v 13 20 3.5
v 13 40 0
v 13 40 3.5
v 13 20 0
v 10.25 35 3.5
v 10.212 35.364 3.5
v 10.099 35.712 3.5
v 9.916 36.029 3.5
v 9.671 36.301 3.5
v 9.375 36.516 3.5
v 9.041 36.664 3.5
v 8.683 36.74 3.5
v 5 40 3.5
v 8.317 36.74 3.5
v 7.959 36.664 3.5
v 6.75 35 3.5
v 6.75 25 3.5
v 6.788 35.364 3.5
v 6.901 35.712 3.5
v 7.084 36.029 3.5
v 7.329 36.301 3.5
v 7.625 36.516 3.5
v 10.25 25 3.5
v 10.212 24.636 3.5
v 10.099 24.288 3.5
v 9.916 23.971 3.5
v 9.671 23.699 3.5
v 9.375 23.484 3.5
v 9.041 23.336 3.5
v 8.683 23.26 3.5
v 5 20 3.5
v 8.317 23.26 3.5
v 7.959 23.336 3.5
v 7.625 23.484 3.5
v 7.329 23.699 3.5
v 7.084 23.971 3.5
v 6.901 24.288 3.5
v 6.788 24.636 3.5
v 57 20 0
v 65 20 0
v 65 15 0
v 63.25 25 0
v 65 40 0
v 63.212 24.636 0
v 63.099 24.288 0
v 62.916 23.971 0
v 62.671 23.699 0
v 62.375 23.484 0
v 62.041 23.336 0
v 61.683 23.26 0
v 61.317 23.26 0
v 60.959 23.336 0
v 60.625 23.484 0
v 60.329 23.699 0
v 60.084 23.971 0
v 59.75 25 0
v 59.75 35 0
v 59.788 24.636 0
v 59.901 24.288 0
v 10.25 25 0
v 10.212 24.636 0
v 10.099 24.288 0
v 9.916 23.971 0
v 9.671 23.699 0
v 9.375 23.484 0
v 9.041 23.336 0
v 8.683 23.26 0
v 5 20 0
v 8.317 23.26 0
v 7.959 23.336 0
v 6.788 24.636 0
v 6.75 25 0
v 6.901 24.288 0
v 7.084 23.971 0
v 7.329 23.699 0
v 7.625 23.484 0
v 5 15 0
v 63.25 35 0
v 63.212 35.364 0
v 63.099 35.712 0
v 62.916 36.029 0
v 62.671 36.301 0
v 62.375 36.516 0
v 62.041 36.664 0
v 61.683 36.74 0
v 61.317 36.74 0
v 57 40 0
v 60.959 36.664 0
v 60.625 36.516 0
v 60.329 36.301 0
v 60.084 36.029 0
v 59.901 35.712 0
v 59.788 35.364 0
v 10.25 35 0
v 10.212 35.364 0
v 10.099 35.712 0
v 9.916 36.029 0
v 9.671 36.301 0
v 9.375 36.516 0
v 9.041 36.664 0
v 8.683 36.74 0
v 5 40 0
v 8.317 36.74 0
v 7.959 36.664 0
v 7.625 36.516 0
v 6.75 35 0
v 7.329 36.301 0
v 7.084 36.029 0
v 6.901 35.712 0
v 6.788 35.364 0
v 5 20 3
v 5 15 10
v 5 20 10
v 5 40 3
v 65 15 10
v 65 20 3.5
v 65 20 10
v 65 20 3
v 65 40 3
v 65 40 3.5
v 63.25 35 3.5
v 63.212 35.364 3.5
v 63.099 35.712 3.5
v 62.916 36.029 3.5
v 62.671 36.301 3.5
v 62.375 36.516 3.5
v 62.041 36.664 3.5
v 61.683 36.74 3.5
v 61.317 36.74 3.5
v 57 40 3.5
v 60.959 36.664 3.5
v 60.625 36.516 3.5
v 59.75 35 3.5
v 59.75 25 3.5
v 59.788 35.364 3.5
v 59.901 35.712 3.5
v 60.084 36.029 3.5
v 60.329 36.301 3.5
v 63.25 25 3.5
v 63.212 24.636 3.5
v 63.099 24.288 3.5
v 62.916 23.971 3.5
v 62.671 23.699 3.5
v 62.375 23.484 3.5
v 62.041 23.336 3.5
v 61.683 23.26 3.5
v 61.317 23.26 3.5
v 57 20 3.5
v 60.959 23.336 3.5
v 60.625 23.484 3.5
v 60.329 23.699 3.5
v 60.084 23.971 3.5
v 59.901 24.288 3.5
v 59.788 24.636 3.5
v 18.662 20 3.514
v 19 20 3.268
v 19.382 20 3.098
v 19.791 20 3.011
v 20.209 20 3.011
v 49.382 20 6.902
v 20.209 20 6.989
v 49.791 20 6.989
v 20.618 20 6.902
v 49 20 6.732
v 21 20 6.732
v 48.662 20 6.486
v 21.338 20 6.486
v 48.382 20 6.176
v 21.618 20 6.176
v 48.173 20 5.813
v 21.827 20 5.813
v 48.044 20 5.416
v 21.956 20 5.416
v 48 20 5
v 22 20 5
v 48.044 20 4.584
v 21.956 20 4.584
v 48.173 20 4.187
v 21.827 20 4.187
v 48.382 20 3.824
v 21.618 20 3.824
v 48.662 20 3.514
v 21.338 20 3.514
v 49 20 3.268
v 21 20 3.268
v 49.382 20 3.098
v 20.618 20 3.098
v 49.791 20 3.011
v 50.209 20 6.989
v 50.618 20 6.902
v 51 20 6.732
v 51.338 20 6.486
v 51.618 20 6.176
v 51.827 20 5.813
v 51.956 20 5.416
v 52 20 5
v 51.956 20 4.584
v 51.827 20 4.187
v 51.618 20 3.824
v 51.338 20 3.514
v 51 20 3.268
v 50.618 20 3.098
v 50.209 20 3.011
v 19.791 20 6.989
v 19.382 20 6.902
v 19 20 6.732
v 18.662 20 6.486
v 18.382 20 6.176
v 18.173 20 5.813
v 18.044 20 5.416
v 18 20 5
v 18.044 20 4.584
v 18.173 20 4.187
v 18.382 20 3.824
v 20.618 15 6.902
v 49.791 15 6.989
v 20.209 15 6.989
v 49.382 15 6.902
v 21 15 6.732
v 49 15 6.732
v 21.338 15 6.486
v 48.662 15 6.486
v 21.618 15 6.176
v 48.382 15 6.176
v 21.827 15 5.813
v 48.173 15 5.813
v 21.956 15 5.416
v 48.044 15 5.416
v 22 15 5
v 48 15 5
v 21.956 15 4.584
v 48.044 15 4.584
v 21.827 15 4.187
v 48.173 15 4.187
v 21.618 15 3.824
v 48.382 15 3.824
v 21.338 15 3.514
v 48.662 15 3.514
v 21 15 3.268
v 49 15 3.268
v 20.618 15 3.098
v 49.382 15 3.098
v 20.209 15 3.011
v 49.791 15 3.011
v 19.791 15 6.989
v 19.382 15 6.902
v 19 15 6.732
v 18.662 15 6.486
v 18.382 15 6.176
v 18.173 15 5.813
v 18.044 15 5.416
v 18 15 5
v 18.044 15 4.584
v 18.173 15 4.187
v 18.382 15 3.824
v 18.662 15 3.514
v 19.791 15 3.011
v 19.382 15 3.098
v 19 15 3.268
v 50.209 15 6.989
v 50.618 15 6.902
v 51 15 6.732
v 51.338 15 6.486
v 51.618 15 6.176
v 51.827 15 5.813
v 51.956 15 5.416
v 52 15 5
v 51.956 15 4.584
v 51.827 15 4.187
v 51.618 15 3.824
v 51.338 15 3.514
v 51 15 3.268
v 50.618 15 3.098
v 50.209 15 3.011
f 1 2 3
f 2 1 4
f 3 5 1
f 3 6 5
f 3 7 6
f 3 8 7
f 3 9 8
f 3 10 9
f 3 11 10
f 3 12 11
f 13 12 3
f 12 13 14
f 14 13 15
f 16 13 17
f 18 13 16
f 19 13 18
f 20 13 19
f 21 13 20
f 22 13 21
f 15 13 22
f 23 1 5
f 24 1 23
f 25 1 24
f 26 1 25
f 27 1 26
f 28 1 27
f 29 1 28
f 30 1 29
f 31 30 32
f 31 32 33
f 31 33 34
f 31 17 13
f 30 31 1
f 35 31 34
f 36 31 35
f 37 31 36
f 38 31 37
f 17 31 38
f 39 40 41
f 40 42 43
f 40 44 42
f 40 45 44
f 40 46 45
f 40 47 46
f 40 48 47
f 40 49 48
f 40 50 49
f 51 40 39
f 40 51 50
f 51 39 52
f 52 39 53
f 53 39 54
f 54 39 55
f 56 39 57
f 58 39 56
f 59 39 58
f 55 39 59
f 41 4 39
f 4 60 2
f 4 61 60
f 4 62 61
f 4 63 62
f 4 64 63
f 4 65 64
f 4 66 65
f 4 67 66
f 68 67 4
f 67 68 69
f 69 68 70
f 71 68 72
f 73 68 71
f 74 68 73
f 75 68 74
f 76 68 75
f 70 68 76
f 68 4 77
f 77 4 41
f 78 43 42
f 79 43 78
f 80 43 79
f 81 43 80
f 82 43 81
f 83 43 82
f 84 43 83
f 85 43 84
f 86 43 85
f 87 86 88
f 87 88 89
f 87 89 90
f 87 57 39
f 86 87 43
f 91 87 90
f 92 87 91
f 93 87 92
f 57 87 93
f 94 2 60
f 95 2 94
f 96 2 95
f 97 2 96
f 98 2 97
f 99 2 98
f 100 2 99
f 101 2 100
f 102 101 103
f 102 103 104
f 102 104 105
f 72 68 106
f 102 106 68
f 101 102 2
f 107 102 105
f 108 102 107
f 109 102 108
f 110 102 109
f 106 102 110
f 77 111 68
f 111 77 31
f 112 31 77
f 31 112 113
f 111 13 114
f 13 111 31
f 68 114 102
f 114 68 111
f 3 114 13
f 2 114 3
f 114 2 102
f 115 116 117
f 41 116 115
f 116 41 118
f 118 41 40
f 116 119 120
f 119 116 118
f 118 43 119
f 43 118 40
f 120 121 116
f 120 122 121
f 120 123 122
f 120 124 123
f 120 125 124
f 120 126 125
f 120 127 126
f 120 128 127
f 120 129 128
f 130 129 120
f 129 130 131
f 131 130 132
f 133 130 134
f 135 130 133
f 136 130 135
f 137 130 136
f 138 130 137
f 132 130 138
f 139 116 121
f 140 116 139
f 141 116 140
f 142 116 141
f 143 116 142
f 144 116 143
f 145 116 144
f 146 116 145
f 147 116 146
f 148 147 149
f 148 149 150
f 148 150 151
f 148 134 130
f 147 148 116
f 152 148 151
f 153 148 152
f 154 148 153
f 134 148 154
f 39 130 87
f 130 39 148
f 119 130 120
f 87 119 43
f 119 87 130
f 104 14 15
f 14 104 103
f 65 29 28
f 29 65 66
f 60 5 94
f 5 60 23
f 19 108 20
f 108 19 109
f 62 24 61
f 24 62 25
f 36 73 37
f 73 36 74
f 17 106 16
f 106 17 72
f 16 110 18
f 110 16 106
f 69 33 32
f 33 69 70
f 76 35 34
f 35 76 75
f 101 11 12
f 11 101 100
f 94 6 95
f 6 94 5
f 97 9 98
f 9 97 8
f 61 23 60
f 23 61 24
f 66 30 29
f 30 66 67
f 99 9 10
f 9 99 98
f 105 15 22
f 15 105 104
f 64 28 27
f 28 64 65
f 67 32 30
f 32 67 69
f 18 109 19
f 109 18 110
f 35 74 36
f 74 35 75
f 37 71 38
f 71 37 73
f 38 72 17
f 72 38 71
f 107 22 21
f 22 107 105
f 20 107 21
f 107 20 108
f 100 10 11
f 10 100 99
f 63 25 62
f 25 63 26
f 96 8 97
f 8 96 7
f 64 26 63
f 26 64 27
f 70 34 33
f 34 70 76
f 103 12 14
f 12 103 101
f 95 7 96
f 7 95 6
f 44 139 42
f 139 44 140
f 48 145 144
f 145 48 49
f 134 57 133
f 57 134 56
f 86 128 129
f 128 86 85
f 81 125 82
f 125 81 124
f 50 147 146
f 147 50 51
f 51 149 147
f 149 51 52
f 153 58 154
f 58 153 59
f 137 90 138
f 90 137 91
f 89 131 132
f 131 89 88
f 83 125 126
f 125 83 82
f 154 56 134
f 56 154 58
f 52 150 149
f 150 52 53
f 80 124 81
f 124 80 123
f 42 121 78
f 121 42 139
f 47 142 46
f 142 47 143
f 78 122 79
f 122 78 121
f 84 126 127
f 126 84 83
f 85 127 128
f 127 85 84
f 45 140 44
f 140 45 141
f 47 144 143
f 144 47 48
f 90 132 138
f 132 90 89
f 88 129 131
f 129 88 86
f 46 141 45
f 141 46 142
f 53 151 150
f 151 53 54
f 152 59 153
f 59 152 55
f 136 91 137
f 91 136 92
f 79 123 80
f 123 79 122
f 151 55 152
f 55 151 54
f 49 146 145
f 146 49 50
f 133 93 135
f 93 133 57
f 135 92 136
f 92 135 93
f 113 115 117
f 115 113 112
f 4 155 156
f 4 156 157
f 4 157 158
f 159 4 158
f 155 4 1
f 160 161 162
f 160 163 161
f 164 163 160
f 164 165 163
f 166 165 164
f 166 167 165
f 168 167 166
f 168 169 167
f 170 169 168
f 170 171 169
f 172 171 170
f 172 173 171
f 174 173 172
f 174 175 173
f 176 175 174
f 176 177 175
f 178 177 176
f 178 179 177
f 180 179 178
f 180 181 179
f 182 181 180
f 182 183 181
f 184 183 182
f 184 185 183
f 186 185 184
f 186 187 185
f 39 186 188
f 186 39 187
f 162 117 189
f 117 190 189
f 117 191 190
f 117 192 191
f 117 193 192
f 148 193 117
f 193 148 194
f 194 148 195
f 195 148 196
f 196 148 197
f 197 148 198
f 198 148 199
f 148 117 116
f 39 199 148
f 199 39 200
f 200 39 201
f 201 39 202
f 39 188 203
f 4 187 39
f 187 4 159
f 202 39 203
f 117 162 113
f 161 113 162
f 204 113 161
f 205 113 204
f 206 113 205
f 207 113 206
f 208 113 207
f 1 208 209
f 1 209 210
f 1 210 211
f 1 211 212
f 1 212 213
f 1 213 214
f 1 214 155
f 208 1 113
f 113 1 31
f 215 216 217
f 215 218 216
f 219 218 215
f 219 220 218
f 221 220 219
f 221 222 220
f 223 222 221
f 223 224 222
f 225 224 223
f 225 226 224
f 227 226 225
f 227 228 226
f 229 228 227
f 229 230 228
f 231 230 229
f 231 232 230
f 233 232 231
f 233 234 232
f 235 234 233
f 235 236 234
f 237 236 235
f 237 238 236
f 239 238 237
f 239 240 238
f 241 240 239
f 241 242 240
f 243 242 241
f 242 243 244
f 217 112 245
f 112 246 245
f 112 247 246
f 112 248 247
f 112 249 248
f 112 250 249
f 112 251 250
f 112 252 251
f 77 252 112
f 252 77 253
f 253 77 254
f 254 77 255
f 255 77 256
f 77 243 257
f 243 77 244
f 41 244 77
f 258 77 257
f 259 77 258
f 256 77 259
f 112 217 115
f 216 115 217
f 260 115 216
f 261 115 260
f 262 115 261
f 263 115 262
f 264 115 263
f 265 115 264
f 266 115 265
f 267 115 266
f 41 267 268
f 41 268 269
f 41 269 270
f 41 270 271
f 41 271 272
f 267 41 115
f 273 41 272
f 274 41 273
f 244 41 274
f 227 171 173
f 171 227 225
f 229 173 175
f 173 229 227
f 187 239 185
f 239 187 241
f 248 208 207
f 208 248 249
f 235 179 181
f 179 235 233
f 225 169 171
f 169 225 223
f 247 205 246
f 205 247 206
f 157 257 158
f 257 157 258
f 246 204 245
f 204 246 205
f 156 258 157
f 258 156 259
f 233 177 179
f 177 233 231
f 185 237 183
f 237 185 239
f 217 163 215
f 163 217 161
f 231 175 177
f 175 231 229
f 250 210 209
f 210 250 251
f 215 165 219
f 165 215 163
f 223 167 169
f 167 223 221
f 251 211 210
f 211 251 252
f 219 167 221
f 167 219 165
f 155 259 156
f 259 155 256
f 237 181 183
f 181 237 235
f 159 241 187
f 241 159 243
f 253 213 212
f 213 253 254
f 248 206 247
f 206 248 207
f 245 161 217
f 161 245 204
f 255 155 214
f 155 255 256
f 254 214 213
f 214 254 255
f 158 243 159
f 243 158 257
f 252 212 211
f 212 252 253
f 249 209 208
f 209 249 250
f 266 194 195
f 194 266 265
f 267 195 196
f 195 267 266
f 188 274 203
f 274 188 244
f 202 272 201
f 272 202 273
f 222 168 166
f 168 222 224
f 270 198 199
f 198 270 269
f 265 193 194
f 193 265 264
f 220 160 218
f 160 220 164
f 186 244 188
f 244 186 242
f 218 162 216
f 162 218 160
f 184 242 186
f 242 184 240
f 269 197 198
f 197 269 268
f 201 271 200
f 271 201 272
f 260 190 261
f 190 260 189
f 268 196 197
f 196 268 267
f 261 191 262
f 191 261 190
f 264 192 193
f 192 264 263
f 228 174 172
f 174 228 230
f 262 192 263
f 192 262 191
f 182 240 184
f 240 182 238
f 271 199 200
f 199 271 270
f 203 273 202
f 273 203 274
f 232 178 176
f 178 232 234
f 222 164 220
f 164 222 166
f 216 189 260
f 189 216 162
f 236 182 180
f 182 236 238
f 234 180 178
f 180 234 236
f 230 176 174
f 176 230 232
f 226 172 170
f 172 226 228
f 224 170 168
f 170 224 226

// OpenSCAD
$fn=30;

difference()
{
	union()
	{
		translate([5,0,0]) cube([8,40,3.5]);
		translate([57,0,0]) cube([8,40,3.5]);
	}
	hull()
	{
		translate([8.5,35,-1]) cylinder(d=3.5,h=6);
		translate([8.5,25,-1]) cylinder(d=3.5,h=6);
	}
	hull()
	{
		translate([61.5,35,-1]) cylinder(d=3.5,h=6);
		translate([61.5,25,-1]) cylinder(d=3.5,h=6);
	}

	translate([-1,-1,-1]) cube([72,20,6]);
	translate ([14,34,-1]) cube([42,26,4]);
	translate ([-1,-1,-1]) cube([6,50,4]);
	translate ([65,-1,-1]) cube([6,50,4]);
}
difference()
	{
	translate ([5,15,0]) cube([60,5,10]);
	translate ([20,21,5]) rotate ([90,0,0]) cylinder(d=4,h=7);
	translate ([50,21,5]) rotate ([90,0,0]) cylinder(d=4,h=7);
	}
